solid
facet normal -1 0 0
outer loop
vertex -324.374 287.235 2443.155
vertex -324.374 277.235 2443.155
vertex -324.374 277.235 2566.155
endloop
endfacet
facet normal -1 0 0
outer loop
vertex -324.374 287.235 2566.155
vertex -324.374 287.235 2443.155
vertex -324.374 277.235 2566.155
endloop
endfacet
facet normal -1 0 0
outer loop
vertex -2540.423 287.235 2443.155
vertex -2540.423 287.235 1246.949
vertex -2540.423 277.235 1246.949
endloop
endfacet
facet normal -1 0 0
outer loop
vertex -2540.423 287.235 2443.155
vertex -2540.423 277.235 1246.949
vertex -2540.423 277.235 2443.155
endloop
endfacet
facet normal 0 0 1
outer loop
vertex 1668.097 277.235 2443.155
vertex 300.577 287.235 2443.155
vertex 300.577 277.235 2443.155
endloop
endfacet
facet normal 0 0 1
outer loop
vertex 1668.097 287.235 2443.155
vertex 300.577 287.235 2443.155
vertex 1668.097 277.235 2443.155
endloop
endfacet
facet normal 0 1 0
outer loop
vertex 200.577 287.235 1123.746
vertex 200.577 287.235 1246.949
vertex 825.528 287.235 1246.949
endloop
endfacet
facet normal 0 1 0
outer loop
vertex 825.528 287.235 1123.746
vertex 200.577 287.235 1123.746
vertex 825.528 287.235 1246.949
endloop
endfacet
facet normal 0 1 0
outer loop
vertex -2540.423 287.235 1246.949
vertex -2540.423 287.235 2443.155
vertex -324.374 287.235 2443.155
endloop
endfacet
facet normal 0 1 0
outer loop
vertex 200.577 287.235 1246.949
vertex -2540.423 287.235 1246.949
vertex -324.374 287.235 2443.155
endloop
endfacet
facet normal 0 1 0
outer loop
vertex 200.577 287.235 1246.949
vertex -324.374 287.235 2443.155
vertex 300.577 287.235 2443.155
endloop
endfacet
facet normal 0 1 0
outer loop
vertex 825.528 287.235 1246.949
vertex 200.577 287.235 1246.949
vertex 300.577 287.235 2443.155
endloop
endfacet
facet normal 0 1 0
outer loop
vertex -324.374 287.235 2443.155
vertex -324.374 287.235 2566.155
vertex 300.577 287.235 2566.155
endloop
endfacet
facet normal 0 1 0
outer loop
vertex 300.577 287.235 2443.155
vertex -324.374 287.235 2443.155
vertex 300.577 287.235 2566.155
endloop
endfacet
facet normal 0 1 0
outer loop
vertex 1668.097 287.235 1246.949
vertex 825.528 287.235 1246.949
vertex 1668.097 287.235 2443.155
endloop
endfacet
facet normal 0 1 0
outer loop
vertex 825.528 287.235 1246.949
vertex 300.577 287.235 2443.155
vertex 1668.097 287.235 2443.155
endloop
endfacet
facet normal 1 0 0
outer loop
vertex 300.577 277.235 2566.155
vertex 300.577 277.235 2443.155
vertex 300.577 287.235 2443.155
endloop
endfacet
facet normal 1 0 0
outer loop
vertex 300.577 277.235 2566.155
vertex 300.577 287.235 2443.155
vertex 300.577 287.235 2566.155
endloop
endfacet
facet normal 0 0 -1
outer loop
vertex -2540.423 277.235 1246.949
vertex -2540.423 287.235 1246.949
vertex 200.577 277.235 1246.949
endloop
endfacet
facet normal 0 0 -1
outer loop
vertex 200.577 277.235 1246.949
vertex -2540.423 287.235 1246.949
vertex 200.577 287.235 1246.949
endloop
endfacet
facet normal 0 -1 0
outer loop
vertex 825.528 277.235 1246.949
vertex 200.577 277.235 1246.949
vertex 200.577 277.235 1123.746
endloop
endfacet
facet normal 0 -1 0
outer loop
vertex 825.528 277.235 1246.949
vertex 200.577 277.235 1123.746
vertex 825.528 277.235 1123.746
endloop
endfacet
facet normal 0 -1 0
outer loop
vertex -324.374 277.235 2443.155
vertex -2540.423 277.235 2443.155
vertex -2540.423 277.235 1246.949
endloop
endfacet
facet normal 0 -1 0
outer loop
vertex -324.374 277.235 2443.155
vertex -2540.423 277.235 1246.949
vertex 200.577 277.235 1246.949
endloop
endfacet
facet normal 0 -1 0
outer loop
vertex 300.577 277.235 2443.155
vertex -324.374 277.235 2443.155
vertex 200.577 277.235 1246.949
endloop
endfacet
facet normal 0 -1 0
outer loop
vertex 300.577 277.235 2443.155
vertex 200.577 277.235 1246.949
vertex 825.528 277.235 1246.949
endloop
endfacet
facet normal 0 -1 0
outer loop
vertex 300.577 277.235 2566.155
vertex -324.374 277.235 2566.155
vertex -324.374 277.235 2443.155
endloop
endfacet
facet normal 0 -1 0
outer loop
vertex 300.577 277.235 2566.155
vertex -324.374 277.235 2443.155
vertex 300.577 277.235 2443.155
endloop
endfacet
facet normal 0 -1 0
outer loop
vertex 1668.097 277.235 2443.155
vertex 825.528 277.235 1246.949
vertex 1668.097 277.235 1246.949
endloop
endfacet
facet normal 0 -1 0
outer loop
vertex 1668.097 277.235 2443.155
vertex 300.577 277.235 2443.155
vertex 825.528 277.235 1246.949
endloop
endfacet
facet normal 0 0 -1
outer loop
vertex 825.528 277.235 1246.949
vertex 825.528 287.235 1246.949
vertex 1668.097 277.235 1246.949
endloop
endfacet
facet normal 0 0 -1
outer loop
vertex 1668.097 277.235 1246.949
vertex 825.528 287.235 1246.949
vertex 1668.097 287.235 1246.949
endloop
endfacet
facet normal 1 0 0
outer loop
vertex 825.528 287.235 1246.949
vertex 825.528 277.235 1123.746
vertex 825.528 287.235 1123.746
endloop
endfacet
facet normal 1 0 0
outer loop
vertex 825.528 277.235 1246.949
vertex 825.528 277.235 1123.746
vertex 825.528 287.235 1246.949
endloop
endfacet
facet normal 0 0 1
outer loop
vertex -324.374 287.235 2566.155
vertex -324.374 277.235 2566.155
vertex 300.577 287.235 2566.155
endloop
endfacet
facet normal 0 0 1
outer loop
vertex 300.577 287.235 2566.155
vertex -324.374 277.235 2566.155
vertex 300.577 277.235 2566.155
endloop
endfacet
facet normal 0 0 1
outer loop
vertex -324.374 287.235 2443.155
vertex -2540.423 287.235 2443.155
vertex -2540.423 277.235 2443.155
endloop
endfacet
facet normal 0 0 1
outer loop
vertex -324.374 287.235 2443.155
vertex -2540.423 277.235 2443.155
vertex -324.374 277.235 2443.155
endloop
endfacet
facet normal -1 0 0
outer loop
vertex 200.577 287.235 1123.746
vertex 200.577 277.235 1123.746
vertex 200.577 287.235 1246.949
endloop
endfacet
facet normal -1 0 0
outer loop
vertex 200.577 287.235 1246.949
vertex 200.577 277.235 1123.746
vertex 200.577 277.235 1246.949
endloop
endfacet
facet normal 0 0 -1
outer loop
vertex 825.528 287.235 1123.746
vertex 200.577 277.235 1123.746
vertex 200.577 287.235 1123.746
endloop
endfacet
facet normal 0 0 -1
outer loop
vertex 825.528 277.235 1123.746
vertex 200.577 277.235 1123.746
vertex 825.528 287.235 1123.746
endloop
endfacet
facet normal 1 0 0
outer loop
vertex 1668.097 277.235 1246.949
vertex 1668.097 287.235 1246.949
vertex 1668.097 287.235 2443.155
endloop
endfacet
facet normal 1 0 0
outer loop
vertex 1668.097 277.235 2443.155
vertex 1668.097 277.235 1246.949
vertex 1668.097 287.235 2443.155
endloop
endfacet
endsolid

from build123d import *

# Parameters (mm, degrees)
SKETCH1_W                                    = 4208.52
SKETCH1_H                                    = 1196.206330057
BOTTOM_PLATE_DEPTH                           = 10
SKETCH4_W                                    = 624.951
SKETCH4_H                                    = 128.202330056
SKETCH4_H_2                                  = 128
PLATE_EXTENSION_FOR_ELEVATOR_MECHANISM_DEPTH = 10


with BuildPart() as part:
    # Sketch1 → Bottom plate (new body)
    with BuildSketch(Plane.XZ.offset(-287.23522809)):
        with Locations((-436.16279664, 1845.051757401)):
            Rectangle(SKETCH1_W, SKETCH1_H)
    extrude(amount=BOTTOM_PLATE_DEPTH)

    # Sketch4 → Plate extension for elevator mechanism (add)
    with BuildSketch(Plane.XZ.offset(-277.23522809)):
        with Locations((513.05270336, 1187.847427344)):
            Rectangle(SKETCH4_W, SKETCH4_H)
        with Locations((-11.89829664, 2502.154922429)):
            Rectangle(SKETCH4_W, SKETCH4_H_2)
    extrude(amount=-PLATE_EXTENSION_FOR_ELEVATOR_MECHANISM_DEPTH)


solid = part.part
